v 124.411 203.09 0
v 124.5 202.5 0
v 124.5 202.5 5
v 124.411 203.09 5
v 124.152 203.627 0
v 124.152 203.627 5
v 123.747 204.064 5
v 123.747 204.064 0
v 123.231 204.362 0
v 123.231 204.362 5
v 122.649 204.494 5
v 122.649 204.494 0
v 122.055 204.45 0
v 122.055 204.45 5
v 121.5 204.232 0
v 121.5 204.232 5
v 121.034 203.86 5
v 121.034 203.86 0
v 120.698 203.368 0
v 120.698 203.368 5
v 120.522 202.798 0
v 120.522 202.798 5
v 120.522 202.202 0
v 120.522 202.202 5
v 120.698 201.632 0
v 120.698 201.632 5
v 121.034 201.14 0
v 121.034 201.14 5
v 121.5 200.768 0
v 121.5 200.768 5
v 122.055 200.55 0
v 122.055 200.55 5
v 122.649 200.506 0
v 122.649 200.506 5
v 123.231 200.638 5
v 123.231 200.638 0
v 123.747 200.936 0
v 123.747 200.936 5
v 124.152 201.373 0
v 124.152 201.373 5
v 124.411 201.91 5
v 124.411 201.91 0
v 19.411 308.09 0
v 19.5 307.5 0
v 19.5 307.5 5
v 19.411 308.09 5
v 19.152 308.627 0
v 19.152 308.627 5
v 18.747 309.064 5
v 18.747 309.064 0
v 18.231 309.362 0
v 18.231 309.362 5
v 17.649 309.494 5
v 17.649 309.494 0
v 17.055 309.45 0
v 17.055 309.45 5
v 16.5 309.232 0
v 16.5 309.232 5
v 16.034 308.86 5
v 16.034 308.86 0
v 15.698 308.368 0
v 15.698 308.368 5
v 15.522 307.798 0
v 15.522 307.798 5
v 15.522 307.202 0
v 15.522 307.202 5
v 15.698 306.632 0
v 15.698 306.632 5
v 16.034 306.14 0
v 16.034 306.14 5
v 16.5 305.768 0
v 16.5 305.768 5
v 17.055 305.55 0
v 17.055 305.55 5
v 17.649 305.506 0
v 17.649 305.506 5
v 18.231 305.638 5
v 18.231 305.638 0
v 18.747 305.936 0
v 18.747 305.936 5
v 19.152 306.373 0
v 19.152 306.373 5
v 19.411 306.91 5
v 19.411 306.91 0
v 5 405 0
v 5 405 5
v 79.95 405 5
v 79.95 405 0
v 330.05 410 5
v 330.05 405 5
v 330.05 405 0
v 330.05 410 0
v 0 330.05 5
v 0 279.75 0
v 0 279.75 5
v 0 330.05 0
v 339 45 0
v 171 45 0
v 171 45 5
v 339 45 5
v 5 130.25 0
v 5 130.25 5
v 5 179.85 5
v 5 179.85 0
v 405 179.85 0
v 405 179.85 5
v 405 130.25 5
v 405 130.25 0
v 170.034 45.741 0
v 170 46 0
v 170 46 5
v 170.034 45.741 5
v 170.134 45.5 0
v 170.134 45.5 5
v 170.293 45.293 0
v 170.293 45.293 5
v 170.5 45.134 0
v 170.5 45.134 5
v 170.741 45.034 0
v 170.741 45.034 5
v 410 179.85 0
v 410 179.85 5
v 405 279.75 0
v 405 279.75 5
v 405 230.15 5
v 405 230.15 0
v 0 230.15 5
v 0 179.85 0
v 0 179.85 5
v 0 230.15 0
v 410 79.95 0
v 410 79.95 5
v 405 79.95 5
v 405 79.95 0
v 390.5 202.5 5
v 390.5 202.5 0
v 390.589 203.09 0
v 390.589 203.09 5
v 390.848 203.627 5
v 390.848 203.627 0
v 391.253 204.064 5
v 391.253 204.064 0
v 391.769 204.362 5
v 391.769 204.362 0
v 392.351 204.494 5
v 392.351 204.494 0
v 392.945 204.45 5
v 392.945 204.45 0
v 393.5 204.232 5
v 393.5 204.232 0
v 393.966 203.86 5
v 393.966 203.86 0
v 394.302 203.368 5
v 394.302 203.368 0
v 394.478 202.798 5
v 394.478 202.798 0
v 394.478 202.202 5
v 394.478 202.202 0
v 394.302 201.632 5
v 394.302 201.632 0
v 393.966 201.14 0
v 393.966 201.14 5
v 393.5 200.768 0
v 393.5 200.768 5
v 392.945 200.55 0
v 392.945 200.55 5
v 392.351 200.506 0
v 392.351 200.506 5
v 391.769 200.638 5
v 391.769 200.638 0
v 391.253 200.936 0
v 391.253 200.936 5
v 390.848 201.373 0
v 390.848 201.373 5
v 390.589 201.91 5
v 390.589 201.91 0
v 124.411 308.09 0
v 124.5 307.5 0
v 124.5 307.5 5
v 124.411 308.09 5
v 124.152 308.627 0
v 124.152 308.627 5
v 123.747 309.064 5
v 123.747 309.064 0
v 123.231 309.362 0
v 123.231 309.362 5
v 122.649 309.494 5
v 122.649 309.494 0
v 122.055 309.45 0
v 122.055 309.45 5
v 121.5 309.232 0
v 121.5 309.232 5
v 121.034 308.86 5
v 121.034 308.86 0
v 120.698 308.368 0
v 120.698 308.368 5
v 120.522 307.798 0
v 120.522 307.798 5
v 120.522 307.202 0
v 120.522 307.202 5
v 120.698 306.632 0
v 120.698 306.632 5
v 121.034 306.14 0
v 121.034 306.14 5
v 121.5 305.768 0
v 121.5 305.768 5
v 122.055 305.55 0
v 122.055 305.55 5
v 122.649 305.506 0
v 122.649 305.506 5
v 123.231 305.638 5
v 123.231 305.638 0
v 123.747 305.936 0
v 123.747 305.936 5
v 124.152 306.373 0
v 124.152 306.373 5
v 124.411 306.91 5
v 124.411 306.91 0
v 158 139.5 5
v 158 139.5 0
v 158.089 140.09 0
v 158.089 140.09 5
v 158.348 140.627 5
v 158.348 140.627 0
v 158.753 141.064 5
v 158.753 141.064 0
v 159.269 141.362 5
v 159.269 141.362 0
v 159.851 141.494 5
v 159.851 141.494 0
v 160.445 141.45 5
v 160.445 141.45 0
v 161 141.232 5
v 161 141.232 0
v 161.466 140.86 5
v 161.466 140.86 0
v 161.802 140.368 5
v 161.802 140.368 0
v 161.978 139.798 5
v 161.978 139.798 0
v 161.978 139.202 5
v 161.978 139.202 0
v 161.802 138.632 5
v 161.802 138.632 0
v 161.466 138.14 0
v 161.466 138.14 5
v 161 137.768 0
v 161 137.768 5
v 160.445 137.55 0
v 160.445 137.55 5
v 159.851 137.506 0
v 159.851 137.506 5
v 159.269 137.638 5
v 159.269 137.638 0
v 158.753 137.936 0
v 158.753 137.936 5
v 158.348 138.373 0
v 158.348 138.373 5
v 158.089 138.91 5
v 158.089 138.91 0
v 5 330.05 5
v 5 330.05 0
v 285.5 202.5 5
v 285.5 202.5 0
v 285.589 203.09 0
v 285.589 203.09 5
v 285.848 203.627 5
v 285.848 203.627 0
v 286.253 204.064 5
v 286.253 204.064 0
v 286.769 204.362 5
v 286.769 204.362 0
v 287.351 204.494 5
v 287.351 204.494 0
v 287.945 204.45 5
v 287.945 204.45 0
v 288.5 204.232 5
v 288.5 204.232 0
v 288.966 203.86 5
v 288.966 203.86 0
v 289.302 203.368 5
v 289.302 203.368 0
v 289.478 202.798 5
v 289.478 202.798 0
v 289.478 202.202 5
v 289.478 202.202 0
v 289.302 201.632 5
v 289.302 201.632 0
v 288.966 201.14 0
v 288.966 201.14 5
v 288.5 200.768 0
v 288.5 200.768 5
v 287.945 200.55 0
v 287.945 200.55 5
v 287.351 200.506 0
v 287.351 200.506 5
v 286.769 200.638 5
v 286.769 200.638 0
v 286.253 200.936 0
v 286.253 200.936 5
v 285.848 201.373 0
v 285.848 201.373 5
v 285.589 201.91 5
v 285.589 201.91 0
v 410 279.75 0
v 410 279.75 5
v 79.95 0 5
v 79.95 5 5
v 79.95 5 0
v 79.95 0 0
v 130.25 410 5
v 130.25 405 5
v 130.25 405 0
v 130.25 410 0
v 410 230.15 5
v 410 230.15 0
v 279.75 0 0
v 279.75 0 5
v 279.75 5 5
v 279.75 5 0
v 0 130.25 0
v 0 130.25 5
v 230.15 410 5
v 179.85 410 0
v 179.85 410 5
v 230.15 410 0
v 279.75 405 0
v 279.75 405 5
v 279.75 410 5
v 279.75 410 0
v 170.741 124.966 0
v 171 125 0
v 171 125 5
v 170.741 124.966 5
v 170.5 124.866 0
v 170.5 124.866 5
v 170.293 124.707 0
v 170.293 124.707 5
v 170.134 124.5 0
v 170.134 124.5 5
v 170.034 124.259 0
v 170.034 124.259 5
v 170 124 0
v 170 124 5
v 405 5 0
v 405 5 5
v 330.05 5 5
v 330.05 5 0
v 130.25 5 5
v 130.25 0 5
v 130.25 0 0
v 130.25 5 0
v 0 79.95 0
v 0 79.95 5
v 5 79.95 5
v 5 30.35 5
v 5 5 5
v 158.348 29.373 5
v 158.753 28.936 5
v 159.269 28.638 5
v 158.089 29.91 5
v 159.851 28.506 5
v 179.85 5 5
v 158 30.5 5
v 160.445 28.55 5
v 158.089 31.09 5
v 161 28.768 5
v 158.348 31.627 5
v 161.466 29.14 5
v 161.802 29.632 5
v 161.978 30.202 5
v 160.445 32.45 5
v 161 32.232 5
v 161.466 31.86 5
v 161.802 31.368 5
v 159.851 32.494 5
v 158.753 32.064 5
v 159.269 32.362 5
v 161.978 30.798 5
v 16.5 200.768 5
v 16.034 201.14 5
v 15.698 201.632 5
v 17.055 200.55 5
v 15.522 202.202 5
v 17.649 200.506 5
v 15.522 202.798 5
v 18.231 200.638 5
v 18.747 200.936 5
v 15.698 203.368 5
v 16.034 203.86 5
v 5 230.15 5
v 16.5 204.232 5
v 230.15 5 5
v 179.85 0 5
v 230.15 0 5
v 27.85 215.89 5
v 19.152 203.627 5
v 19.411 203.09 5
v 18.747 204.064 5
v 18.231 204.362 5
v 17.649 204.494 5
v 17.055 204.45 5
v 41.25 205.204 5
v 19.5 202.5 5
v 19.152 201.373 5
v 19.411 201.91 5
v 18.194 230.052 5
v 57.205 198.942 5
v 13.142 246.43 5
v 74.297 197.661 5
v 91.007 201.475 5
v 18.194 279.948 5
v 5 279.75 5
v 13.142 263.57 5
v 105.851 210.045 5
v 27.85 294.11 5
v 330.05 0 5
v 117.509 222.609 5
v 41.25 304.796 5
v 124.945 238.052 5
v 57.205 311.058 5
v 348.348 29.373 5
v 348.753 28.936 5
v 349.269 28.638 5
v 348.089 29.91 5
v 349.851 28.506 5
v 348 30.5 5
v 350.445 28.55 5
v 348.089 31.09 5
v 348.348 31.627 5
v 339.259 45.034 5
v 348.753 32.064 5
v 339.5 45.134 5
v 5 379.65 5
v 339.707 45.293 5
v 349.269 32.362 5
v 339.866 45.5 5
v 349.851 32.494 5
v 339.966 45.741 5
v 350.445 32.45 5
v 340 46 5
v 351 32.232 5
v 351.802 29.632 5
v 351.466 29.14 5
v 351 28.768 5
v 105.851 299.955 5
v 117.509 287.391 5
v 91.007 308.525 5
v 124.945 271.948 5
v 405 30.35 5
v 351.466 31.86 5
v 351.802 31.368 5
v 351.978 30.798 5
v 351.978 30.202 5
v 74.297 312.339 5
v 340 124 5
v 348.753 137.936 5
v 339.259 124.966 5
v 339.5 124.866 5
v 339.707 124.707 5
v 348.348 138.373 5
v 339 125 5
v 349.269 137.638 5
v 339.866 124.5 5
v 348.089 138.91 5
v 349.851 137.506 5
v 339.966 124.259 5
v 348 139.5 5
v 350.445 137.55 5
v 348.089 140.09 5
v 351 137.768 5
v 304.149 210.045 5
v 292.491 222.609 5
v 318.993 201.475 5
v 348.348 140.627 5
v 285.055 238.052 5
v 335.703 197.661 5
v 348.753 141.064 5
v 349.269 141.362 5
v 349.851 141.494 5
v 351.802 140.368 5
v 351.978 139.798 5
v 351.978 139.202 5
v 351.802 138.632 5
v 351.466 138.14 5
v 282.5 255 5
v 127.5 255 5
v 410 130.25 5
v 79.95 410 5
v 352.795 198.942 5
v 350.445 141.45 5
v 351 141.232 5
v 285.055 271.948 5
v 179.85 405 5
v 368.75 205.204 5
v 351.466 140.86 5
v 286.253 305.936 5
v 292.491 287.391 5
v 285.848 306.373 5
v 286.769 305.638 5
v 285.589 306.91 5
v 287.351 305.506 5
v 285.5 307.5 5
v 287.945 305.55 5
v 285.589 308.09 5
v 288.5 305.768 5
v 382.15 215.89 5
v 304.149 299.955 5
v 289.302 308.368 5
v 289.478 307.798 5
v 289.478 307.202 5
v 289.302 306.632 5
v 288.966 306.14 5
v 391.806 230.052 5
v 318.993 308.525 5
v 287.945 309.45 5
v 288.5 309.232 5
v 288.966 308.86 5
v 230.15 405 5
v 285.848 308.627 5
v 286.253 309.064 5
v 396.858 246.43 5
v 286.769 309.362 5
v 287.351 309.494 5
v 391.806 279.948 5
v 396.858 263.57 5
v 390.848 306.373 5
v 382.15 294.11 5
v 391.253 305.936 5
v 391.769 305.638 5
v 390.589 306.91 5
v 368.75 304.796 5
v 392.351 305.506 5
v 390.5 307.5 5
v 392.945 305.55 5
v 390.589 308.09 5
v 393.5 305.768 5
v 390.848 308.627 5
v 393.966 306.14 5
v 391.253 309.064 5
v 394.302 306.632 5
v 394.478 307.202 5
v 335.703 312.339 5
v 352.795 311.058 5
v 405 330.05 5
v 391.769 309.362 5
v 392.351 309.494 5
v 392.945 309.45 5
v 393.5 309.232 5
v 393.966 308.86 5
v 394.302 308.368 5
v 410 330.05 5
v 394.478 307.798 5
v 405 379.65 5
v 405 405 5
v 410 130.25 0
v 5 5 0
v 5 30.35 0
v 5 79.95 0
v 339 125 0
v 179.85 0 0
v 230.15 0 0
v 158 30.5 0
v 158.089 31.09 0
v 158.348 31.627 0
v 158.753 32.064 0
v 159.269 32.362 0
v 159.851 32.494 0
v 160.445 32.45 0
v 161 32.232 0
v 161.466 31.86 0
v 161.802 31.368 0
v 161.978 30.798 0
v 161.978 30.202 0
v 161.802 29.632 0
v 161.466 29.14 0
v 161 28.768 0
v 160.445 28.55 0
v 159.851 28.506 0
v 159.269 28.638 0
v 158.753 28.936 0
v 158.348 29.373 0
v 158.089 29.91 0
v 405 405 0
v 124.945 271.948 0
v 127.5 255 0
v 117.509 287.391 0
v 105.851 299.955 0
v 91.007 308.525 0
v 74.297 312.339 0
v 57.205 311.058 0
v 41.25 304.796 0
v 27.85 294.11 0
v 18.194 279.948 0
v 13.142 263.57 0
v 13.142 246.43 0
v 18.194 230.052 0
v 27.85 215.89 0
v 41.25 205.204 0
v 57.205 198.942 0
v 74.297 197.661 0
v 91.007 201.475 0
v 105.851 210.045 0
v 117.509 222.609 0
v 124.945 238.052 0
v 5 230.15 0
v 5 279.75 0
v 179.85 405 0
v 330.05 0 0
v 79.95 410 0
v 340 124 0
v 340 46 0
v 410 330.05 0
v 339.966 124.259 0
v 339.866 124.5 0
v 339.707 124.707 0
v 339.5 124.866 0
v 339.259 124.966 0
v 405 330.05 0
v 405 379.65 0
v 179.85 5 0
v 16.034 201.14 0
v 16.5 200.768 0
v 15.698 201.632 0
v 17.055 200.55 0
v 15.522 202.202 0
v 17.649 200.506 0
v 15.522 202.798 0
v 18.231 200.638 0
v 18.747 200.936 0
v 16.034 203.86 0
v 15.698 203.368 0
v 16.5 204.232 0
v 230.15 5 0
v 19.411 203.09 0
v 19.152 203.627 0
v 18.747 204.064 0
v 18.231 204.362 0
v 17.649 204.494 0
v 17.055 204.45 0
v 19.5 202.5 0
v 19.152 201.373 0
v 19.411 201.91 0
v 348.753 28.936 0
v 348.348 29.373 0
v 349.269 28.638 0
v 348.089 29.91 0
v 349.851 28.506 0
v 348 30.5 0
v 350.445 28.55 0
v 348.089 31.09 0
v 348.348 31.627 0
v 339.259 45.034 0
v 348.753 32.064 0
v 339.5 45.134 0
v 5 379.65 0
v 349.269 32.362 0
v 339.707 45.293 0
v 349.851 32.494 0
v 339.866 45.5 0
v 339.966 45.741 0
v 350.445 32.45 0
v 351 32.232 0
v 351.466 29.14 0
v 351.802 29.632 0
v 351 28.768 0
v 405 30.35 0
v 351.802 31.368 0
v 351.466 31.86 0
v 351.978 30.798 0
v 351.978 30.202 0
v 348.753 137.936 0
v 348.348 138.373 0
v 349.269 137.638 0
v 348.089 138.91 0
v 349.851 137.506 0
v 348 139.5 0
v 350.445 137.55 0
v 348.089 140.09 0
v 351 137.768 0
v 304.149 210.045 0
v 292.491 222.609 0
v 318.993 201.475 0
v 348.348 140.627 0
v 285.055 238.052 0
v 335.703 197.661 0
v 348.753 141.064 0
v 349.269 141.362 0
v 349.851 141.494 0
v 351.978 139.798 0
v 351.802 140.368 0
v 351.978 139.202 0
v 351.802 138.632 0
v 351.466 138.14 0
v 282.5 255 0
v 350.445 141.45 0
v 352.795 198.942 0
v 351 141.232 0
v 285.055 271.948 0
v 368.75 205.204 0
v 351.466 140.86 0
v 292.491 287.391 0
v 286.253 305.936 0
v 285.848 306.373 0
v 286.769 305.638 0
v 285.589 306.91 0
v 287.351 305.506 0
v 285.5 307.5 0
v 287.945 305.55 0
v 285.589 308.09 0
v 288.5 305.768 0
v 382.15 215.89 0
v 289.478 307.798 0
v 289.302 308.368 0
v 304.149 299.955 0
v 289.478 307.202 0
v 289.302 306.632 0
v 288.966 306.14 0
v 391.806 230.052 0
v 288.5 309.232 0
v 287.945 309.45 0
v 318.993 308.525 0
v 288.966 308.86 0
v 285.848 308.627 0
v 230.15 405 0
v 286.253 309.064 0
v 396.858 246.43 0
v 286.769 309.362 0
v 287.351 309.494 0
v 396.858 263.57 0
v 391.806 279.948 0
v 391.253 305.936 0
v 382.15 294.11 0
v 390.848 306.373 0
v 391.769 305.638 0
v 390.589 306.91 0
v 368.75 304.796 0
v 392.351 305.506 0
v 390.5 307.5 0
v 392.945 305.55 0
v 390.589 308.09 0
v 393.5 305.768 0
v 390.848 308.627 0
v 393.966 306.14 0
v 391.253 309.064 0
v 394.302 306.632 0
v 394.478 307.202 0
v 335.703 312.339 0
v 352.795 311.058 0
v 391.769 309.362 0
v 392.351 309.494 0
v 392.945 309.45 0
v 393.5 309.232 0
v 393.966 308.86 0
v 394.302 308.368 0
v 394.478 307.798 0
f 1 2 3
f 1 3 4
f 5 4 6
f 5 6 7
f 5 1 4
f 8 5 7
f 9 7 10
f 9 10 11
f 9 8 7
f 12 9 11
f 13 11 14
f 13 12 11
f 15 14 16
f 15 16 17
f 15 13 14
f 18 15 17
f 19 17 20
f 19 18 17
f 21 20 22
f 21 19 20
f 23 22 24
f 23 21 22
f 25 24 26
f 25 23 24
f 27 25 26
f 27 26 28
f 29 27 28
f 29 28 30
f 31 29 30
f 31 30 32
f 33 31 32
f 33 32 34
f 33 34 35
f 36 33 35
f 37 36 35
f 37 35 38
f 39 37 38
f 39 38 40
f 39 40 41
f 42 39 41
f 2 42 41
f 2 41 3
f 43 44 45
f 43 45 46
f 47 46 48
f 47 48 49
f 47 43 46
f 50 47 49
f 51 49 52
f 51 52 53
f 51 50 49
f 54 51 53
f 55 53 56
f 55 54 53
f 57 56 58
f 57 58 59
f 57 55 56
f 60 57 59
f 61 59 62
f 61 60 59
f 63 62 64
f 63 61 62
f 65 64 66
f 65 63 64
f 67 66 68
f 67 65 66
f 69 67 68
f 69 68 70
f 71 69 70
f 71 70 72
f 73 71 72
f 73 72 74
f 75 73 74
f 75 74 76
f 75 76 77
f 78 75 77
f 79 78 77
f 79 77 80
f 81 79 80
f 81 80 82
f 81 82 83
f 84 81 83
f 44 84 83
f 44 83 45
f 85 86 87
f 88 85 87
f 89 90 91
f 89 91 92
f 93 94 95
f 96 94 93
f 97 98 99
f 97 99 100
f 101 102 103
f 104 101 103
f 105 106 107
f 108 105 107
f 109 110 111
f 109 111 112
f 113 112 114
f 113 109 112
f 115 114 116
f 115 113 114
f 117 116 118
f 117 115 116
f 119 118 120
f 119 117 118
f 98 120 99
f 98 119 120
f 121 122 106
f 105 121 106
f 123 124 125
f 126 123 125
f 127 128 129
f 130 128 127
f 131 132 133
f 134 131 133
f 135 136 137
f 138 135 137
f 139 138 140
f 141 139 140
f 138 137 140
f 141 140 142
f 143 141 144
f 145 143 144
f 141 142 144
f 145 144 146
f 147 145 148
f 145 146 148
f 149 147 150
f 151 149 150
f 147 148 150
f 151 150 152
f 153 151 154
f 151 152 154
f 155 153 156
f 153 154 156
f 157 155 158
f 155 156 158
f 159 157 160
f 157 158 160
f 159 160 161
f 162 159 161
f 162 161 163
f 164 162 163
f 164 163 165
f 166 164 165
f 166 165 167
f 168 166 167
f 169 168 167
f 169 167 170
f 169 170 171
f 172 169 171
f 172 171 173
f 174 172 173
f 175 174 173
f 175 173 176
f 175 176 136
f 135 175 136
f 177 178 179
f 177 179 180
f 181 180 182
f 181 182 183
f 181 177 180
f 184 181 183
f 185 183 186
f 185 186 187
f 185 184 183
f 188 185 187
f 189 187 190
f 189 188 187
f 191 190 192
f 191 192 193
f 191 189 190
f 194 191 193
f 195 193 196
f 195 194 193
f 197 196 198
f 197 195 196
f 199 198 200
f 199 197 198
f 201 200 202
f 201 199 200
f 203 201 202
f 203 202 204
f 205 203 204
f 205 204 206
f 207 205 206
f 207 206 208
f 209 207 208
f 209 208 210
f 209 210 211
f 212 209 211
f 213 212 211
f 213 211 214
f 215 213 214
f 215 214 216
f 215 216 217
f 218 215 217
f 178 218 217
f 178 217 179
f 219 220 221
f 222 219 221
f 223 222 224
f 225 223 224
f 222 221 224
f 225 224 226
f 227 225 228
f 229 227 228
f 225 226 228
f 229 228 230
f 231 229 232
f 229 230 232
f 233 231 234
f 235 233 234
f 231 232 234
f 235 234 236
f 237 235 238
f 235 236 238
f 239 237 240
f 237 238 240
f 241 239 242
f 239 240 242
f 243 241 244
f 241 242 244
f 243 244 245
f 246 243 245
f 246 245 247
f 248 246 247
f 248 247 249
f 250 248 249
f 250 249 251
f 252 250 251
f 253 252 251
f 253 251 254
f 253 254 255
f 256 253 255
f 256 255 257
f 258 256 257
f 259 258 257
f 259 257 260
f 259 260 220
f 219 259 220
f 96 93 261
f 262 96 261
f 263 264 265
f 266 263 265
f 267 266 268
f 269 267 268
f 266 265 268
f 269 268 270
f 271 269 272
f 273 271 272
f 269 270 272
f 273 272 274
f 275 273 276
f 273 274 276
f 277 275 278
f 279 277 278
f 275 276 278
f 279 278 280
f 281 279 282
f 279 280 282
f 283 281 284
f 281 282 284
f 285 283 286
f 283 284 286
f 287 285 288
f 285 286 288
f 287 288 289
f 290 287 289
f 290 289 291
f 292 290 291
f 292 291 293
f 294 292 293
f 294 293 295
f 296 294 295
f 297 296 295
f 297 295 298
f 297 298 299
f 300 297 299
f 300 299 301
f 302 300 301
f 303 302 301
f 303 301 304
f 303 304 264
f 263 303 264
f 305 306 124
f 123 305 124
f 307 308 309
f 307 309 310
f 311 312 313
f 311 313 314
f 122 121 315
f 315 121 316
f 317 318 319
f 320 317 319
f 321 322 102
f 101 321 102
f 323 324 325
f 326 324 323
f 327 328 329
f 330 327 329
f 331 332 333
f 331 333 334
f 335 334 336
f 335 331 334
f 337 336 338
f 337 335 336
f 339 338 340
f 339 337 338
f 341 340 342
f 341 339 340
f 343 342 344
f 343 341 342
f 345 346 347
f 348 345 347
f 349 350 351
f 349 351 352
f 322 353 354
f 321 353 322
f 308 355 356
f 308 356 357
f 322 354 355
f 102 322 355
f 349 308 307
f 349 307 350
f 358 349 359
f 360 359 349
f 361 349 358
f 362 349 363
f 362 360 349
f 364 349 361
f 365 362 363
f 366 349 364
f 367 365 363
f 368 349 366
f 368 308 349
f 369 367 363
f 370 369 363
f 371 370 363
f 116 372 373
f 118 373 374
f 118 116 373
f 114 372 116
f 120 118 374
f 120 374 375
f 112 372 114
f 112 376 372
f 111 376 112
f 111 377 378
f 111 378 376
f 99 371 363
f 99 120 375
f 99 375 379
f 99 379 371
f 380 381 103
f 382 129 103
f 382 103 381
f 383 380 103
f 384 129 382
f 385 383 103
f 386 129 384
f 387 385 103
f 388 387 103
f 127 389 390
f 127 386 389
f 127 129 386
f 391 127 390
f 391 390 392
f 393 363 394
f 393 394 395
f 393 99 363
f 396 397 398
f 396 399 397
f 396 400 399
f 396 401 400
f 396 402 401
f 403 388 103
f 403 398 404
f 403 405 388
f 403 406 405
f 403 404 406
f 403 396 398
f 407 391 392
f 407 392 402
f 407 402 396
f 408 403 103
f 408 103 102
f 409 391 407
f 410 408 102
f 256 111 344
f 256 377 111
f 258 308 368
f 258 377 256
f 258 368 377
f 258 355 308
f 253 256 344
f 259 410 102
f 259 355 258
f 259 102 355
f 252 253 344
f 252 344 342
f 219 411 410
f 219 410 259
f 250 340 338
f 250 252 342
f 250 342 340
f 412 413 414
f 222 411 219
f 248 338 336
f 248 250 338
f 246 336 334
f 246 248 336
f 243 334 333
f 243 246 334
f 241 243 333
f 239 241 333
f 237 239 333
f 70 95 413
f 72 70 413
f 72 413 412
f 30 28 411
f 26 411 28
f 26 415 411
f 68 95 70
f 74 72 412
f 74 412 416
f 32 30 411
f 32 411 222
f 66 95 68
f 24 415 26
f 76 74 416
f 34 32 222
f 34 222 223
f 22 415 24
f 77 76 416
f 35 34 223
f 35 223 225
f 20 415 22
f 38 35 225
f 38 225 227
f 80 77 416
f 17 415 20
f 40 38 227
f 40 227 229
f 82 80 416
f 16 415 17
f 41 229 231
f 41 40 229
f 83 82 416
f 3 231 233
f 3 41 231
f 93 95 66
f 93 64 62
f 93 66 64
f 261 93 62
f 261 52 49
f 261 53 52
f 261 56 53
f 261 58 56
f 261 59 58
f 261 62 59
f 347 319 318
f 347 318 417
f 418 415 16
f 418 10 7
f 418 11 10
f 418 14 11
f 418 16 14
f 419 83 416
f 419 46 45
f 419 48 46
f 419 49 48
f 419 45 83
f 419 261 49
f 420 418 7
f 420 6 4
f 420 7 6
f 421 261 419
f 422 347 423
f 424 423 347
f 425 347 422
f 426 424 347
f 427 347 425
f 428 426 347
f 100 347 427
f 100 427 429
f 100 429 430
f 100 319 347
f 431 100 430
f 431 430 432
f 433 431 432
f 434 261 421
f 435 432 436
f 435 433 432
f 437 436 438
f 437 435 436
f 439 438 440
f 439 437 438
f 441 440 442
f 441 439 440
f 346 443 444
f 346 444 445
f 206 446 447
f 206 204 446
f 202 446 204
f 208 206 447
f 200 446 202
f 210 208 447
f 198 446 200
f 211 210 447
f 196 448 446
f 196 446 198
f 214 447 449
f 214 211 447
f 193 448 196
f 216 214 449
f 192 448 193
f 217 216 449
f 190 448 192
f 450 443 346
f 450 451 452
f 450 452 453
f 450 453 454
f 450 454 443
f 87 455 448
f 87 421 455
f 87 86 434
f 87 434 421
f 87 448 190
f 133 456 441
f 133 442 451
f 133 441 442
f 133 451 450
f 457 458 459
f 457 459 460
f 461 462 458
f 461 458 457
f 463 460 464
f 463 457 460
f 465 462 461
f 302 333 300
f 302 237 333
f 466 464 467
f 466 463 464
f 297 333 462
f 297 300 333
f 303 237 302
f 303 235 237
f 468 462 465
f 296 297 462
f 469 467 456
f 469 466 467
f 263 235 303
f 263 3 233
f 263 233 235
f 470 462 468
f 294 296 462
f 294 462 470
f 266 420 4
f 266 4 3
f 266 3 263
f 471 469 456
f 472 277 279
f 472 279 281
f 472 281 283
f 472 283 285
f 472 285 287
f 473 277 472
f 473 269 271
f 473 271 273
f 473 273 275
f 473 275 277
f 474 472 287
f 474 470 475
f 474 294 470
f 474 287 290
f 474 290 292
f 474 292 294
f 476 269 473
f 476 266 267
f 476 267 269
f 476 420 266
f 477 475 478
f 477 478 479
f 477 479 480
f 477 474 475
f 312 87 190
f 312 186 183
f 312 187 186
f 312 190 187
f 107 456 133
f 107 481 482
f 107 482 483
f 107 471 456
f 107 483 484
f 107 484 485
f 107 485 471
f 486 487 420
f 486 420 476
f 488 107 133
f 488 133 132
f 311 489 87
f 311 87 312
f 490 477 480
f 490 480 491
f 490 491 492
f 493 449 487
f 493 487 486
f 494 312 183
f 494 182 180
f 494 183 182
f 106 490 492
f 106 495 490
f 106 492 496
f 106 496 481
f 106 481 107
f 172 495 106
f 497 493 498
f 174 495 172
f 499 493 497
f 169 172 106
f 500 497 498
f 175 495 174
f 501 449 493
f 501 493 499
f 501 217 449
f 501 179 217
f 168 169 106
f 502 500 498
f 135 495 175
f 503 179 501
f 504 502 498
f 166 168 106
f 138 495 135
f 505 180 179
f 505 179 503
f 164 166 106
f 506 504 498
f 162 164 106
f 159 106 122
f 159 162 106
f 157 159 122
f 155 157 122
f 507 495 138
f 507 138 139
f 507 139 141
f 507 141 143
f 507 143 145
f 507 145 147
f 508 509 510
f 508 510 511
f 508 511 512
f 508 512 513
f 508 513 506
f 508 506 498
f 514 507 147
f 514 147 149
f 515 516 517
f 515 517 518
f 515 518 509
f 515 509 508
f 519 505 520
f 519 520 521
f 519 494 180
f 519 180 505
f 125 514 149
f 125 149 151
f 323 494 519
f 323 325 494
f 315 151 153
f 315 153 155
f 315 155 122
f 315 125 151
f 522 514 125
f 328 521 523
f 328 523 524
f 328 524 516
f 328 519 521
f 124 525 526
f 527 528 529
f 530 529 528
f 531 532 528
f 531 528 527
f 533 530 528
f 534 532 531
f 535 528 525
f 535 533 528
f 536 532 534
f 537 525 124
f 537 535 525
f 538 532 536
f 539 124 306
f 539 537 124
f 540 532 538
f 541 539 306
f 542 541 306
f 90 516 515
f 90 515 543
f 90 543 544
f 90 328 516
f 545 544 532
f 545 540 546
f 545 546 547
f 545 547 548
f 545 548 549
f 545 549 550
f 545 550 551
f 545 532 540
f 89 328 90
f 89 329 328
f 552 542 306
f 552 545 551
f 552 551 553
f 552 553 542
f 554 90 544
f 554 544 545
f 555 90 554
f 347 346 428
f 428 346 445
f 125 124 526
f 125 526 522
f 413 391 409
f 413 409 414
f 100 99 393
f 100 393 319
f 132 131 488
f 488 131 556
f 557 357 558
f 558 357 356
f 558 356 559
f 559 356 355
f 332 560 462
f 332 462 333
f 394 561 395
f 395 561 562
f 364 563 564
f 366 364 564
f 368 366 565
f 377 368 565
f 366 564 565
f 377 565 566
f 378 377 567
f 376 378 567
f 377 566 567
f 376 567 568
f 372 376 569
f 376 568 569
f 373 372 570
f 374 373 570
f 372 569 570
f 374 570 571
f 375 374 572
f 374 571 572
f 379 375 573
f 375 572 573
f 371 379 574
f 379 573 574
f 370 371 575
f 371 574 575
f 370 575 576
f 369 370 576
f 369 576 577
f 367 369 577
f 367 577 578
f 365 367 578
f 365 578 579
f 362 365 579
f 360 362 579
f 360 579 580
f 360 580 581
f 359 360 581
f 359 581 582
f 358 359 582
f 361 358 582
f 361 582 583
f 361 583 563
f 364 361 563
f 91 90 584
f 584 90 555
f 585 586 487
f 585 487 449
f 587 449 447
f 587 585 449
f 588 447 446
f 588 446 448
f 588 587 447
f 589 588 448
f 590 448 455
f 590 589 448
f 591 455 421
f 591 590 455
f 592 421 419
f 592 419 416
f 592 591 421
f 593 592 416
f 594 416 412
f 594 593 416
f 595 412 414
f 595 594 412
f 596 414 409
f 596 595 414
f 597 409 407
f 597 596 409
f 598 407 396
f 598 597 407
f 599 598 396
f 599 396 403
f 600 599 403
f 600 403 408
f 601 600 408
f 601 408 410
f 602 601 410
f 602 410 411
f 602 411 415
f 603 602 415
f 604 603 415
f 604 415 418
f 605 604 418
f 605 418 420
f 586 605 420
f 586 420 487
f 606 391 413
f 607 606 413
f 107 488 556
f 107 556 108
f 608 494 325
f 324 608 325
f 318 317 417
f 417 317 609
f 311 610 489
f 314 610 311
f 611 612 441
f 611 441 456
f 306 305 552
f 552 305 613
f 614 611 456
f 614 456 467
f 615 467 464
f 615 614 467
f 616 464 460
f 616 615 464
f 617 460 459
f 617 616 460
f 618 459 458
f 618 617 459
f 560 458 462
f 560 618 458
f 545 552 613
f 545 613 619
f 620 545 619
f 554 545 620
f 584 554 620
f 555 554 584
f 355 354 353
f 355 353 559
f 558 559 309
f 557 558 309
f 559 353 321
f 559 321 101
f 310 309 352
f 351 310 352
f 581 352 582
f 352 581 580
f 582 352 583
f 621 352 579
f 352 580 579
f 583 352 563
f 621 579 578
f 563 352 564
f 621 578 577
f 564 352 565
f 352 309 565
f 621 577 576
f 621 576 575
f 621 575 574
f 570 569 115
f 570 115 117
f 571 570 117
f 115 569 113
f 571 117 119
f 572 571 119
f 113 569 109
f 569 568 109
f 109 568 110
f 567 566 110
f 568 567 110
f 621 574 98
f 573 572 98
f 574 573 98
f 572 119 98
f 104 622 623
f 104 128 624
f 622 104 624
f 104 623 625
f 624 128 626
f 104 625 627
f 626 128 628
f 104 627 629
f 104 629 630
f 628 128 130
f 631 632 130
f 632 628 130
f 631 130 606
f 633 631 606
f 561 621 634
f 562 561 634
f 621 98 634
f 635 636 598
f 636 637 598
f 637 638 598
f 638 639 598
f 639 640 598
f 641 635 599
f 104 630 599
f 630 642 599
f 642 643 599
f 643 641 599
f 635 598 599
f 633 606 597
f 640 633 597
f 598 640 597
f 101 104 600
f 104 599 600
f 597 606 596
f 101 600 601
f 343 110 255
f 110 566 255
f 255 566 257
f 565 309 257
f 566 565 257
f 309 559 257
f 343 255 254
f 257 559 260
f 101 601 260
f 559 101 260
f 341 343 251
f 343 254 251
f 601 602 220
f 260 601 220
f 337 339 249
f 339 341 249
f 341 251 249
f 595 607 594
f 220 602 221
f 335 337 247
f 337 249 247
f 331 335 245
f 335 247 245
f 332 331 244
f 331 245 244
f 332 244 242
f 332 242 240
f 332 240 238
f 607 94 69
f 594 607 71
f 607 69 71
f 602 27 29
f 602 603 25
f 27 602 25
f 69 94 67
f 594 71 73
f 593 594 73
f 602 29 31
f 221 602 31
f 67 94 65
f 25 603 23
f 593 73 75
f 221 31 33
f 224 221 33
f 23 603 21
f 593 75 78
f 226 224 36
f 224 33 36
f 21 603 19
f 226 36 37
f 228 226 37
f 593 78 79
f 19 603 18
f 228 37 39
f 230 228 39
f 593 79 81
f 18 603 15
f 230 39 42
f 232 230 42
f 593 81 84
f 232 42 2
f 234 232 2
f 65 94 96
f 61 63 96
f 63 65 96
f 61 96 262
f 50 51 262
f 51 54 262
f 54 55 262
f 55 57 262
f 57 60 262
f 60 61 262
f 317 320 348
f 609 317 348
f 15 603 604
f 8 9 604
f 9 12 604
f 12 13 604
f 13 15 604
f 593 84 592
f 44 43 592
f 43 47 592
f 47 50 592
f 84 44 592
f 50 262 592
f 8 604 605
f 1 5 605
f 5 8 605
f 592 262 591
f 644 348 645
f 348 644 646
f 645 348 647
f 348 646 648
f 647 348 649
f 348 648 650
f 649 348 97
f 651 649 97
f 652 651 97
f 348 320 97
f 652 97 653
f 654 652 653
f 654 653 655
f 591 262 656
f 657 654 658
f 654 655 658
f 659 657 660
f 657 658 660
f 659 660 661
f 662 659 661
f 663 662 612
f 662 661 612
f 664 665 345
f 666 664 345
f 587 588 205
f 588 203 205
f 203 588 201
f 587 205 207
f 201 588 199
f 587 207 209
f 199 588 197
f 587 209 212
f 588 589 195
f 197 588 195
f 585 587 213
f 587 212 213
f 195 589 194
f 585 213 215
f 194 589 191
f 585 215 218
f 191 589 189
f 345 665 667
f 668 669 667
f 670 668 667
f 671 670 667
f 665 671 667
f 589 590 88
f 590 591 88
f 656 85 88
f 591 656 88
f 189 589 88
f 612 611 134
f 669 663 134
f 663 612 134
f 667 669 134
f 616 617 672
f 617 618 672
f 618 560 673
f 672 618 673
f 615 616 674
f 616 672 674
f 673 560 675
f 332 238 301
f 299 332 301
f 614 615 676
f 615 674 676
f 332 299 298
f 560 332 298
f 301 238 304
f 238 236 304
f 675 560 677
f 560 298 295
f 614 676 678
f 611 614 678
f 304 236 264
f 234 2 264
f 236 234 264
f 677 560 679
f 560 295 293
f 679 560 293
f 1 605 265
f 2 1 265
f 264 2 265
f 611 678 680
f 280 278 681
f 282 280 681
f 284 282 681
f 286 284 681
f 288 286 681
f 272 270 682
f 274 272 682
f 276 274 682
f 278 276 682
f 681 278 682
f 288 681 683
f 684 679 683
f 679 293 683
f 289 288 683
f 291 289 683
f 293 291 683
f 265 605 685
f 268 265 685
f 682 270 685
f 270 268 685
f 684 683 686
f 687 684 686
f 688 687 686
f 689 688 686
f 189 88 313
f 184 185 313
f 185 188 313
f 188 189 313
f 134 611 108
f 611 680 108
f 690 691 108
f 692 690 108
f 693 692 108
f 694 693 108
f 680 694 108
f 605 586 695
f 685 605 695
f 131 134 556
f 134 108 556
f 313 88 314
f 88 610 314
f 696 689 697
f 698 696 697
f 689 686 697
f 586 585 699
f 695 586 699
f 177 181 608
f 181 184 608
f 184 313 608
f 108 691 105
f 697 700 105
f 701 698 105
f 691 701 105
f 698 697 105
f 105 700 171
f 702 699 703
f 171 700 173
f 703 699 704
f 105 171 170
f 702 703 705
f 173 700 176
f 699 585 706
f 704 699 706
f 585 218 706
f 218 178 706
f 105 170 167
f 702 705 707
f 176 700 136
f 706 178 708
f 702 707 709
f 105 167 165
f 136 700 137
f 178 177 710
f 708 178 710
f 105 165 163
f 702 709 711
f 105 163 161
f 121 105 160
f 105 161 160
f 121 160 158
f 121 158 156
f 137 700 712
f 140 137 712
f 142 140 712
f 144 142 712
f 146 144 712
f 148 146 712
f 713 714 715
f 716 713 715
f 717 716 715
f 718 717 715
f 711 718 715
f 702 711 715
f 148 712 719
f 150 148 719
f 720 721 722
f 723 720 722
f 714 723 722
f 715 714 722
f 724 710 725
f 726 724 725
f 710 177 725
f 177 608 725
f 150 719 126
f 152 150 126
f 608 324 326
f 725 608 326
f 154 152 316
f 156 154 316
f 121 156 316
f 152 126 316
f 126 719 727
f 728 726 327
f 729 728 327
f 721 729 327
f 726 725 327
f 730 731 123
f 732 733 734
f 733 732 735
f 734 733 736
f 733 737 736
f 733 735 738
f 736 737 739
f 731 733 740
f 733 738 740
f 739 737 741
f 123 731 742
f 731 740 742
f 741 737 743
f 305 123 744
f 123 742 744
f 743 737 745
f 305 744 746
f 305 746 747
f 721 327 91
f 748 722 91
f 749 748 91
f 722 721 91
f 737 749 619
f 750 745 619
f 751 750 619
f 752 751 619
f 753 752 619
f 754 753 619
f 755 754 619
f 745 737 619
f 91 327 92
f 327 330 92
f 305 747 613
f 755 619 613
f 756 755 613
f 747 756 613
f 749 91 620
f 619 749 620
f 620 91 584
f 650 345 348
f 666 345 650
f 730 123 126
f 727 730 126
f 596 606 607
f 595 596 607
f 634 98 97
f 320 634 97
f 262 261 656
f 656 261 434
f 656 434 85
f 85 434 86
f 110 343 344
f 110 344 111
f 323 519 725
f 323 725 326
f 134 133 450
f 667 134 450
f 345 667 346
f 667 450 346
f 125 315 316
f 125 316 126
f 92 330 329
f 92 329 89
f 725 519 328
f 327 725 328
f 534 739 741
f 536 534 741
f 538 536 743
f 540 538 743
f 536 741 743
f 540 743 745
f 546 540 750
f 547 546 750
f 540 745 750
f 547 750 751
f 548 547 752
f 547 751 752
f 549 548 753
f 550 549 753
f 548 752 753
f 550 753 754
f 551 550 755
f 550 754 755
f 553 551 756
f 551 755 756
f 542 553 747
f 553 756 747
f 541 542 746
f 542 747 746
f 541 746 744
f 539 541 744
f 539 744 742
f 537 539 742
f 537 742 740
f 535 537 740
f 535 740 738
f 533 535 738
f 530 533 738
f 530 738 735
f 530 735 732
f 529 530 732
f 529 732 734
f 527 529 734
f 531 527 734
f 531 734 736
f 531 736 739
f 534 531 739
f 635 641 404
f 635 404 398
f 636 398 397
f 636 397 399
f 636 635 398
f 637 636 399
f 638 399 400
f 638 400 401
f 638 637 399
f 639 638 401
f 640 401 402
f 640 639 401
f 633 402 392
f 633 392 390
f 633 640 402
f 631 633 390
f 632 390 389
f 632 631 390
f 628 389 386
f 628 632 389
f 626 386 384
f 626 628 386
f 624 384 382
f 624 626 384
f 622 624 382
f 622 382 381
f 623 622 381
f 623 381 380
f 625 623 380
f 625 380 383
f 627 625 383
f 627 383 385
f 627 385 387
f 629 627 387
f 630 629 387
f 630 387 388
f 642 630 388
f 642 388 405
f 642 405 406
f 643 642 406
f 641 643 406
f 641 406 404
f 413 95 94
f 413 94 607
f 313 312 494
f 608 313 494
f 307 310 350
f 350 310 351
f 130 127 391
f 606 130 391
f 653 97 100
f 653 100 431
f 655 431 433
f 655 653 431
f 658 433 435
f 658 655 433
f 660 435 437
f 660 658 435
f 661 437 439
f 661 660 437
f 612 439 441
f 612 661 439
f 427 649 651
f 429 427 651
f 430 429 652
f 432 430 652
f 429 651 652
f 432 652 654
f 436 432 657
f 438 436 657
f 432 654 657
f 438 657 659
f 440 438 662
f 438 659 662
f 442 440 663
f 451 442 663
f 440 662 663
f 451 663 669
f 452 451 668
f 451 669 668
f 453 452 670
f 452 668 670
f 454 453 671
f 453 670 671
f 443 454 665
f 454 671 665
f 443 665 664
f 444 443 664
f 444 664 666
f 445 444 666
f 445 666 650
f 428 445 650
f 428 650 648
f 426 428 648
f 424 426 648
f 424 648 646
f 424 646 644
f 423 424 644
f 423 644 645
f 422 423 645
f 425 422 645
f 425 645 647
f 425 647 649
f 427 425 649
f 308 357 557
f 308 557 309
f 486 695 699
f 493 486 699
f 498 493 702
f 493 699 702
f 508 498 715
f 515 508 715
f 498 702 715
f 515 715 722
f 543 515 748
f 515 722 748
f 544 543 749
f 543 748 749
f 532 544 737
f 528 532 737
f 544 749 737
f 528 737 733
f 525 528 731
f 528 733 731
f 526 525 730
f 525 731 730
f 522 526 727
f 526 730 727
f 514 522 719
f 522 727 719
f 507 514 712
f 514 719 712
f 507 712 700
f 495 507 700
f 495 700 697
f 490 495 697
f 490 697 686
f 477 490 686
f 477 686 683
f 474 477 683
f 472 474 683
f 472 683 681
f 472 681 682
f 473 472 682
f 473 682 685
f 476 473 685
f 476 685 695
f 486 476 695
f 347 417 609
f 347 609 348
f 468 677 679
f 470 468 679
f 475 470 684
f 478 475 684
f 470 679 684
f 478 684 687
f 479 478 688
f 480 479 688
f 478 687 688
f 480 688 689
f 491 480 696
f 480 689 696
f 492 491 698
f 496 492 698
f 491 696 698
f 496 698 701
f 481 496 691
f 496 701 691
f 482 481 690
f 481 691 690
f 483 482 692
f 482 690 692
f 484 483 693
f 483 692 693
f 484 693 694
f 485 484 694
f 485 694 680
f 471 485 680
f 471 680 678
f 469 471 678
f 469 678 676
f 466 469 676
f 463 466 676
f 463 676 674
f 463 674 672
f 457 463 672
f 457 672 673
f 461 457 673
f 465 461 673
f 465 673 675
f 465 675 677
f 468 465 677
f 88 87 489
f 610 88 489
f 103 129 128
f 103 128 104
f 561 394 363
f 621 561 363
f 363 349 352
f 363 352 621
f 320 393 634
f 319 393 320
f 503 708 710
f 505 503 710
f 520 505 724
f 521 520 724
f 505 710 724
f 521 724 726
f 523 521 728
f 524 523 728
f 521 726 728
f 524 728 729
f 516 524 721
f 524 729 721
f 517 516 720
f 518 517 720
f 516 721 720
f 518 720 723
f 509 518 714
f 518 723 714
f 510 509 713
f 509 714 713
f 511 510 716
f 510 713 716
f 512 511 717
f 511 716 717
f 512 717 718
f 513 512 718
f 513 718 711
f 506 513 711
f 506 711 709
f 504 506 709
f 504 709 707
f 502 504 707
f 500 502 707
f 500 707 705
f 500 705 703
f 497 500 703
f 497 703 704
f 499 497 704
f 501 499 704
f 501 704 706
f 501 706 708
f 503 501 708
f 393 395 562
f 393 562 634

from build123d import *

# Parameters (mm, degrees)
SKIZZE1_W                       = 410
SKIZZE1_H                       = 410
AUFSATZ_LINEAR_AUSTRAGEN1_DEPTH = 5
SKIZZE2_W                       = 97.796702903
SKIZZE2_H                       = 49.6
SCHNITT_LINEAR_AUSTRAGEN1_DEPTH = 5
LINEARES_MUSTER1_COUNT          = 4
LINEARES_MUSTER1_PITCH          = 99.9
SPIEGELN1_COPY_1_SKETCH_W       = 97.796702903
SPIEGELN1_COPY_1_SKETCH_H       = 49.6
SPIEGELN1_COPY_1_DEPTH          = 5
SPIEGELN1_COPY_2_SKETCH_W       = 97.796702903
SPIEGELN1_COPY_2_SKETCH_H       = 49.6
SPIEGELN1_COPY_2_DEPTH          = 5
SPIEGELN1_COPY_3_SKETCH_W       = 97.796702903
SPIEGELN1_COPY_3_SKETCH_H       = 49.6
SPIEGELN1_COPY_3_DEPTH          = 5
SKIZZE3_W                       = 49.6
SKIZZE3_H                       = 41.77912255
SCHNITT_LINEAR_AUSTRAGEN2_DEPTH = 5
LINEARES_MUSTER2_COUNT          = 4
LINEARES_MUSTER2_PITCH          = 99.9
SPIEGELN2_COPY_1_SKETCH_W       = 49.6
SPIEGELN2_COPY_1_SKETCH_H       = 41.77912255
SPIEGELN2_COPY_1_DEPTH          = 5
SPIEGELN2_COPY_2_SKETCH_W       = 49.6
SPIEGELN2_COPY_2_SKETCH_H       = 41.77912255
SPIEGELN2_COPY_2_DEPTH          = 5
SPIEGELN2_COPY_3_SKETCH_W       = 49.6
SPIEGELN2_COPY_3_SKETCH_H       = 41.77912255
SPIEGELN2_COPY_3_DEPTH          = 5
SCHNITT_LINEAR_AUSTRAGEN3_DEPTH = 5
SPIEGELN4_COPY_1_DEPTH          = 5
SCHNITT_LINEAR_AUSTRAGEN4_REACH = 581.849
SKIZZE5_R                       = 57.5
SKIZZE5_R_2                     = 2
SKIZZE5_3_R                     = 2
SCHNITT_LINEAR_AUSTRAGEN5_DEPTH = 10


with BuildPart() as part:
    # Skizze1 → Aufsatz-Linear austragen1 (new body)
    with BuildSketch(Plane.XY):
        with Locations((205, 205)):
            Rectangle(SKIZZE1_W, SKIZZE1_H)
    extrude(amount=AUFSATZ_LINEAR_AUSTRAGEN1_DEPTH)

    # Skizze2 → Schnitt-Linear austragen1 (cut)
    with BuildSketch(Plane.XY.offset(5)):
        with Locations((-43.898351452, 354.85)):
            Rectangle(SKIZZE2_W, SKIZZE2_H)
    schnitt_linear_austragen1 = extrude(amount=-SCHNITT_LINEAR_AUSTRAGEN1_DEPTH, mode=Mode.SUBTRACT)

    # Lineares Muster1: Schnitt-Linear austragen1 ×4
    with Locations(*[(0, -i * LINEARES_MUSTER1_PITCH, 0) for i in range(1, LINEARES_MUSTER1_COUNT)]):
        add(schnitt_linear_austragen1, mode=Mode.SUBTRACT)

    # Spiegeln1: Schnitt-Linear austragen1 across plane
    add(schnitt_linear_austragen1.mirror(Plane(origin=(205, 0, 0), x_dir=(0, 0, 1), z_dir=(1, 0, 0))), mode=Mode.SUBTRACT)

    # Spiegeln1 copy 1 sketch → Spiegeln1 copy 1 (cut)
    with BuildSketch(Plane(origin=(410, -99.9, 5), x_dir=(-1, 0, 0), z_dir=(0, 0, 1))):
        with Locations((-43.898351452, -354.85)):
            Rectangle(SPIEGELN1_COPY_1_SKETCH_W, SPIEGELN1_COPY_1_SKETCH_H)
    extrude(amount=-SPIEGELN1_COPY_1_DEPTH, mode=Mode.SUBTRACT)

    # Spiegeln1 copy 2 sketch → Spiegeln1 copy 2 (cut)
    with BuildSketch(Plane(origin=(410, -199.8, 5), x_dir=(-1, 0, 0), z_dir=(0, 0, 1))):
        with Locations((-43.898351452, -354.85)):
            Rectangle(SPIEGELN1_COPY_2_SKETCH_W, SPIEGELN1_COPY_2_SKETCH_H)
    extrude(amount=-SPIEGELN1_COPY_2_DEPTH, mode=Mode.SUBTRACT)

    # Spiegeln1 copy 3 sketch → Spiegeln1 copy 3 (cut)
    with BuildSketch(Plane(origin=(410, -299.7, 5), x_dir=(-1, 0, 0), z_dir=(0, 0, 1))):
        with Locations((-43.898351452, -354.85)):
            Rectangle(SPIEGELN1_COPY_3_SKETCH_W, SPIEGELN1_COPY_3_SKETCH_H)
    extrude(amount=-SPIEGELN1_COPY_3_DEPTH, mode=Mode.SUBTRACT)

    # Skizze3 → Schnitt-Linear austragen2 (cut)
    with BuildSketch(Plane.XY.offset(5)):
        with Locations((55.15, 425.889561275)):
            Rectangle(SKIZZE3_W, SKIZZE3_H)
    schnitt_linear_austragen2 = extrude(amount=-SCHNITT_LINEAR_AUSTRAGEN2_DEPTH, mode=Mode.SUBTRACT)

    # Lineares Muster2: Schnitt-Linear austragen2 ×4
    with Locations(*[(i * LINEARES_MUSTER2_PITCH, 0, 0) for i in range(1, LINEARES_MUSTER2_COUNT)]):
        add(schnitt_linear_austragen2, mode=Mode.SUBTRACT)

    # Spiegeln2: Schnitt-Linear austragen2 across plane
    add(schnitt_linear_austragen2.mirror(Plane.ZX.offset(205)), mode=Mode.SUBTRACT)

    # Spiegeln2 copy 1 sketch → Spiegeln2 copy 1 (cut)
    with BuildSketch(Plane(origin=(99.9, 410, 5), x_dir=(1, 0, 0), z_dir=(0, 0, 1))):
        with Locations((55.15, -425.889561275)):
            Rectangle(SPIEGELN2_COPY_1_SKETCH_W, SPIEGELN2_COPY_1_SKETCH_H)
    extrude(amount=-SPIEGELN2_COPY_1_DEPTH, mode=Mode.SUBTRACT)

    # Spiegeln2 copy 2 sketch → Spiegeln2 copy 2 (cut)
    with BuildSketch(Plane(origin=(199.8, 410, 5), x_dir=(1, 0, 0), z_dir=(0, 0, 1))):
        with Locations((55.15, -425.889561275)):
            Rectangle(SPIEGELN2_COPY_2_SKETCH_W, SPIEGELN2_COPY_2_SKETCH_H)
    extrude(amount=-SPIEGELN2_COPY_2_DEPTH, mode=Mode.SUBTRACT)

    # Spiegeln2 copy 3 sketch → Spiegeln2 copy 3 (cut)
    with BuildSketch(Plane(origin=(299.7, 410, 5), x_dir=(1, 0, 0), z_dir=(0, 0, 1))):
        with Locations((55.15, -425.889561275)):
            Rectangle(SPIEGELN2_COPY_3_SKETCH_W, SPIEGELN2_COPY_3_SKETCH_H)
    extrude(amount=-SPIEGELN2_COPY_3_DEPTH, mode=Mode.SUBTRACT)

    # Skizze4 → Schnitt-Linear austragen3 (cut)
    with BuildSketch(Plane.XY.offset(5)):
        Polygon((5, 379.65), (5, 405), (30.35, 405), (30.35, 431.549801047), (5, 431.549801047), (-47.862925009, 431.549801047), (-47.862925009, 405), (-47.862925009, 379.65), align=None)
    schnitt_linear_austragen3 = extrude(amount=-SCHNITT_LINEAR_AUSTRAGEN3_DEPTH, mode=Mode.SUBTRACT)

    # Spiegeln3: Schnitt-Linear austragen3 across plane
    add(schnitt_linear_austragen3.mirror(Plane(origin=(205, 0, 0), x_dir=(0, 0, 1), z_dir=(1, 0, 0))), mode=Mode.SUBTRACT)

    # Spiegeln4: Schnitt-Linear austragen3 across plane
    add(schnitt_linear_austragen3.mirror(Plane.ZX.offset(205)), mode=Mode.SUBTRACT)

    # Spiegeln4 copy 1 sketch → Spiegeln4 copy 1 (cut)
    with BuildSketch(Plane(origin=(410, 410, 5), x_dir=(-1, 0, 0), z_dir=(0, 0, 1))):
        Polygon((5, 379.65), (5, 405), (30.35, 405), (30.35, 431.549801047), (5, 431.549801047), (-47.862925009, 431.549801047), (-47.862925009, 405), (-47.862925009, 379.65), align=None)
    extrude(amount=-SPIEGELN4_COPY_1_DEPTH, mode=Mode.SUBTRACT)

    # Skizze5 → Schnitt-Linear austragen4 (cut, up to next)
    with BuildSketch(Plane(origin=(0, 0, 0), x_dir=(-1, 0, 0), z_dir=(0, 0, -1)), mode=Mode.PRIVATE) as schnitt_linear_austragen4_sk1:
        with Locations((-340, 255)):
            Circle(SKIZZE5_R)
    schnitt_linear_austragen4_tool1 = extrude(schnitt_linear_austragen4_sk1.sketch, amount=-SCHNITT_LINEAR_AUSTRAGEN4_REACH, mode=Mode.PRIVATE) & part.part
    # Skizze5 → Schnitt-Linear austragen4 (cut, up to next)
    with BuildSketch(Plane(origin=(0, 0, 0), x_dir=(-1, 0, 0), z_dir=(0, 0, -1)), mode=Mode.PRIVATE) as schnitt_linear_austragen4_sk2:
        with Locations((-287.5, 307.5)):
            Circle(SKIZZE5_R_2)
    schnitt_linear_austragen4_tool2 = extrude(schnitt_linear_austragen4_sk2.sketch, amount=-SCHNITT_LINEAR_AUSTRAGEN4_REACH, mode=Mode.PRIVATE) & part.part
    # Skizze5 → Schnitt-Linear austragen4 (cut, up to next)
    with BuildSketch(Plane(origin=(0, 0, 0), x_dir=(-1, 0, 0), z_dir=(0, 0, -1)), mode=Mode.PRIVATE) as schnitt_linear_austragen4_sk3:
        with Locations((-392.5, 202.5)):
            Circle(SKIZZE5_R_2)
    schnitt_linear_austragen4_tool3 = extrude(schnitt_linear_austragen4_sk3.sketch, amount=-SCHNITT_LINEAR_AUSTRAGEN4_REACH, mode=Mode.PRIVATE) & part.part
    # Skizze5 → Schnitt-Linear austragen4 (cut, up to next)
    with BuildSketch(Plane(origin=(0, 0, 0), x_dir=(-1, 0, 0), z_dir=(0, 0, -1)), mode=Mode.PRIVATE) as schnitt_linear_austragen4_sk4:
        with Locations((-392.5, 307.5)):
            Circle(SKIZZE5_R_2)
    schnitt_linear_austragen4_tool4 = extrude(schnitt_linear_austragen4_sk4.sketch, amount=-SCHNITT_LINEAR_AUSTRAGEN4_REACH, mode=Mode.PRIVATE) & part.part
    # Skizze5 → Schnitt-Linear austragen4 (cut, up to next)
    with BuildSketch(Plane(origin=(0, 0, 0), x_dir=(-1, 0, 0), z_dir=(0, 0, -1)), mode=Mode.PRIVATE) as schnitt_linear_austragen4_sk5:
        with Locations((-287.5, 202.5)):
            Circle(SKIZZE5_R_2)
    schnitt_linear_austragen4_tool5 = extrude(schnitt_linear_austragen4_sk5.sketch, amount=-SCHNITT_LINEAR_AUSTRAGEN4_REACH, mode=Mode.PRIVATE) & part.part
    schnitt_linear_austragen4_1 = schnitt_linear_austragen4_tool1.solids().sort_by_distance((340, 255, 0))[0]
    add(schnitt_linear_austragen4_1, mode=Mode.SUBTRACT)
    schnitt_linear_austragen4_2 = schnitt_linear_austragen4_tool2.solids().sort_by_distance((287.5, 307.5, 0))[0]
    add(schnitt_linear_austragen4_2, mode=Mode.SUBTRACT)
    schnitt_linear_austragen4_3 = schnitt_linear_austragen4_tool3.solids().sort_by_distance((392.5, 202.5, 0))[0]
    add(schnitt_linear_austragen4_3, mode=Mode.SUBTRACT)
    schnitt_linear_austragen4_4 = schnitt_linear_austragen4_tool4.solids().sort_by_distance((392.5, 307.5, 0))[0]
    add(schnitt_linear_austragen4_4, mode=Mode.SUBTRACT)
    schnitt_linear_austragen4_5 = schnitt_linear_austragen4_tool5.solids().sort_by_distance((287.5, 202.5, 0))[0]
    add(schnitt_linear_austragen4_5, mode=Mode.SUBTRACT)
    schnitt_linear_austragen4 = schnitt_linear_austragen4_1 + schnitt_linear_austragen4_2 + schnitt_linear_austragen4_3 + schnitt_linear_austragen4_4 + schnitt_linear_austragen4_5  # Schnitt-Linear austragen4 as one shape, for the pattern or mirror that repeats it

    # Skizze5<3> → Schnitt-Linear austragen5 (cut)
    with BuildSketch(Plane(origin=(0, 0, 0), x_dir=(-1, 0, 0), z_dir=(0, 0, -1))):
        with Locations((-350, 139.5)):
            Circle(SKIZZE5_3_R)
        with Locations((-160, 139.5)):
            Circle(SKIZZE5_3_R)
        with Locations((-160, 30.5)):
            Circle(SKIZZE5_3_R)
        with Locations((-350, 30.5)):
            Circle(SKIZZE5_3_R)
        with BuildLine():
            Line((-339, 125), (-171, 125))
            ThreePointArc((-171, 125), (-170.292893219, 124.707106781), (-170, 124))
            Line((-170, 124), (-170, 46))
            ThreePointArc((-170, 46), (-170.292893219, 45.292893219), (-171, 45))
            Line((-171, 45), (-339, 45))
            ThreePointArc((-339, 45), (-339.707106781, 45.292893219), (-340, 46))
            Line((-340, 46), (-340, 124))
            ThreePointArc((-340, 124), (-339.707106781, 124.707106781), (-339, 125))
        make_face()
    extrude(amount=-SCHNITT_LINEAR_AUSTRAGEN5_DEPTH, mode=Mode.SUBTRACT)

    # Spiegeln5: Schnitt-Linear austragen4 across plane
    add(schnitt_linear_austragen4.mirror(Plane(origin=(205, 0, 0), x_dir=(0, 0, 1), z_dir=(1, 0, 0))), mode=Mode.SUBTRACT)


solid = part.part
